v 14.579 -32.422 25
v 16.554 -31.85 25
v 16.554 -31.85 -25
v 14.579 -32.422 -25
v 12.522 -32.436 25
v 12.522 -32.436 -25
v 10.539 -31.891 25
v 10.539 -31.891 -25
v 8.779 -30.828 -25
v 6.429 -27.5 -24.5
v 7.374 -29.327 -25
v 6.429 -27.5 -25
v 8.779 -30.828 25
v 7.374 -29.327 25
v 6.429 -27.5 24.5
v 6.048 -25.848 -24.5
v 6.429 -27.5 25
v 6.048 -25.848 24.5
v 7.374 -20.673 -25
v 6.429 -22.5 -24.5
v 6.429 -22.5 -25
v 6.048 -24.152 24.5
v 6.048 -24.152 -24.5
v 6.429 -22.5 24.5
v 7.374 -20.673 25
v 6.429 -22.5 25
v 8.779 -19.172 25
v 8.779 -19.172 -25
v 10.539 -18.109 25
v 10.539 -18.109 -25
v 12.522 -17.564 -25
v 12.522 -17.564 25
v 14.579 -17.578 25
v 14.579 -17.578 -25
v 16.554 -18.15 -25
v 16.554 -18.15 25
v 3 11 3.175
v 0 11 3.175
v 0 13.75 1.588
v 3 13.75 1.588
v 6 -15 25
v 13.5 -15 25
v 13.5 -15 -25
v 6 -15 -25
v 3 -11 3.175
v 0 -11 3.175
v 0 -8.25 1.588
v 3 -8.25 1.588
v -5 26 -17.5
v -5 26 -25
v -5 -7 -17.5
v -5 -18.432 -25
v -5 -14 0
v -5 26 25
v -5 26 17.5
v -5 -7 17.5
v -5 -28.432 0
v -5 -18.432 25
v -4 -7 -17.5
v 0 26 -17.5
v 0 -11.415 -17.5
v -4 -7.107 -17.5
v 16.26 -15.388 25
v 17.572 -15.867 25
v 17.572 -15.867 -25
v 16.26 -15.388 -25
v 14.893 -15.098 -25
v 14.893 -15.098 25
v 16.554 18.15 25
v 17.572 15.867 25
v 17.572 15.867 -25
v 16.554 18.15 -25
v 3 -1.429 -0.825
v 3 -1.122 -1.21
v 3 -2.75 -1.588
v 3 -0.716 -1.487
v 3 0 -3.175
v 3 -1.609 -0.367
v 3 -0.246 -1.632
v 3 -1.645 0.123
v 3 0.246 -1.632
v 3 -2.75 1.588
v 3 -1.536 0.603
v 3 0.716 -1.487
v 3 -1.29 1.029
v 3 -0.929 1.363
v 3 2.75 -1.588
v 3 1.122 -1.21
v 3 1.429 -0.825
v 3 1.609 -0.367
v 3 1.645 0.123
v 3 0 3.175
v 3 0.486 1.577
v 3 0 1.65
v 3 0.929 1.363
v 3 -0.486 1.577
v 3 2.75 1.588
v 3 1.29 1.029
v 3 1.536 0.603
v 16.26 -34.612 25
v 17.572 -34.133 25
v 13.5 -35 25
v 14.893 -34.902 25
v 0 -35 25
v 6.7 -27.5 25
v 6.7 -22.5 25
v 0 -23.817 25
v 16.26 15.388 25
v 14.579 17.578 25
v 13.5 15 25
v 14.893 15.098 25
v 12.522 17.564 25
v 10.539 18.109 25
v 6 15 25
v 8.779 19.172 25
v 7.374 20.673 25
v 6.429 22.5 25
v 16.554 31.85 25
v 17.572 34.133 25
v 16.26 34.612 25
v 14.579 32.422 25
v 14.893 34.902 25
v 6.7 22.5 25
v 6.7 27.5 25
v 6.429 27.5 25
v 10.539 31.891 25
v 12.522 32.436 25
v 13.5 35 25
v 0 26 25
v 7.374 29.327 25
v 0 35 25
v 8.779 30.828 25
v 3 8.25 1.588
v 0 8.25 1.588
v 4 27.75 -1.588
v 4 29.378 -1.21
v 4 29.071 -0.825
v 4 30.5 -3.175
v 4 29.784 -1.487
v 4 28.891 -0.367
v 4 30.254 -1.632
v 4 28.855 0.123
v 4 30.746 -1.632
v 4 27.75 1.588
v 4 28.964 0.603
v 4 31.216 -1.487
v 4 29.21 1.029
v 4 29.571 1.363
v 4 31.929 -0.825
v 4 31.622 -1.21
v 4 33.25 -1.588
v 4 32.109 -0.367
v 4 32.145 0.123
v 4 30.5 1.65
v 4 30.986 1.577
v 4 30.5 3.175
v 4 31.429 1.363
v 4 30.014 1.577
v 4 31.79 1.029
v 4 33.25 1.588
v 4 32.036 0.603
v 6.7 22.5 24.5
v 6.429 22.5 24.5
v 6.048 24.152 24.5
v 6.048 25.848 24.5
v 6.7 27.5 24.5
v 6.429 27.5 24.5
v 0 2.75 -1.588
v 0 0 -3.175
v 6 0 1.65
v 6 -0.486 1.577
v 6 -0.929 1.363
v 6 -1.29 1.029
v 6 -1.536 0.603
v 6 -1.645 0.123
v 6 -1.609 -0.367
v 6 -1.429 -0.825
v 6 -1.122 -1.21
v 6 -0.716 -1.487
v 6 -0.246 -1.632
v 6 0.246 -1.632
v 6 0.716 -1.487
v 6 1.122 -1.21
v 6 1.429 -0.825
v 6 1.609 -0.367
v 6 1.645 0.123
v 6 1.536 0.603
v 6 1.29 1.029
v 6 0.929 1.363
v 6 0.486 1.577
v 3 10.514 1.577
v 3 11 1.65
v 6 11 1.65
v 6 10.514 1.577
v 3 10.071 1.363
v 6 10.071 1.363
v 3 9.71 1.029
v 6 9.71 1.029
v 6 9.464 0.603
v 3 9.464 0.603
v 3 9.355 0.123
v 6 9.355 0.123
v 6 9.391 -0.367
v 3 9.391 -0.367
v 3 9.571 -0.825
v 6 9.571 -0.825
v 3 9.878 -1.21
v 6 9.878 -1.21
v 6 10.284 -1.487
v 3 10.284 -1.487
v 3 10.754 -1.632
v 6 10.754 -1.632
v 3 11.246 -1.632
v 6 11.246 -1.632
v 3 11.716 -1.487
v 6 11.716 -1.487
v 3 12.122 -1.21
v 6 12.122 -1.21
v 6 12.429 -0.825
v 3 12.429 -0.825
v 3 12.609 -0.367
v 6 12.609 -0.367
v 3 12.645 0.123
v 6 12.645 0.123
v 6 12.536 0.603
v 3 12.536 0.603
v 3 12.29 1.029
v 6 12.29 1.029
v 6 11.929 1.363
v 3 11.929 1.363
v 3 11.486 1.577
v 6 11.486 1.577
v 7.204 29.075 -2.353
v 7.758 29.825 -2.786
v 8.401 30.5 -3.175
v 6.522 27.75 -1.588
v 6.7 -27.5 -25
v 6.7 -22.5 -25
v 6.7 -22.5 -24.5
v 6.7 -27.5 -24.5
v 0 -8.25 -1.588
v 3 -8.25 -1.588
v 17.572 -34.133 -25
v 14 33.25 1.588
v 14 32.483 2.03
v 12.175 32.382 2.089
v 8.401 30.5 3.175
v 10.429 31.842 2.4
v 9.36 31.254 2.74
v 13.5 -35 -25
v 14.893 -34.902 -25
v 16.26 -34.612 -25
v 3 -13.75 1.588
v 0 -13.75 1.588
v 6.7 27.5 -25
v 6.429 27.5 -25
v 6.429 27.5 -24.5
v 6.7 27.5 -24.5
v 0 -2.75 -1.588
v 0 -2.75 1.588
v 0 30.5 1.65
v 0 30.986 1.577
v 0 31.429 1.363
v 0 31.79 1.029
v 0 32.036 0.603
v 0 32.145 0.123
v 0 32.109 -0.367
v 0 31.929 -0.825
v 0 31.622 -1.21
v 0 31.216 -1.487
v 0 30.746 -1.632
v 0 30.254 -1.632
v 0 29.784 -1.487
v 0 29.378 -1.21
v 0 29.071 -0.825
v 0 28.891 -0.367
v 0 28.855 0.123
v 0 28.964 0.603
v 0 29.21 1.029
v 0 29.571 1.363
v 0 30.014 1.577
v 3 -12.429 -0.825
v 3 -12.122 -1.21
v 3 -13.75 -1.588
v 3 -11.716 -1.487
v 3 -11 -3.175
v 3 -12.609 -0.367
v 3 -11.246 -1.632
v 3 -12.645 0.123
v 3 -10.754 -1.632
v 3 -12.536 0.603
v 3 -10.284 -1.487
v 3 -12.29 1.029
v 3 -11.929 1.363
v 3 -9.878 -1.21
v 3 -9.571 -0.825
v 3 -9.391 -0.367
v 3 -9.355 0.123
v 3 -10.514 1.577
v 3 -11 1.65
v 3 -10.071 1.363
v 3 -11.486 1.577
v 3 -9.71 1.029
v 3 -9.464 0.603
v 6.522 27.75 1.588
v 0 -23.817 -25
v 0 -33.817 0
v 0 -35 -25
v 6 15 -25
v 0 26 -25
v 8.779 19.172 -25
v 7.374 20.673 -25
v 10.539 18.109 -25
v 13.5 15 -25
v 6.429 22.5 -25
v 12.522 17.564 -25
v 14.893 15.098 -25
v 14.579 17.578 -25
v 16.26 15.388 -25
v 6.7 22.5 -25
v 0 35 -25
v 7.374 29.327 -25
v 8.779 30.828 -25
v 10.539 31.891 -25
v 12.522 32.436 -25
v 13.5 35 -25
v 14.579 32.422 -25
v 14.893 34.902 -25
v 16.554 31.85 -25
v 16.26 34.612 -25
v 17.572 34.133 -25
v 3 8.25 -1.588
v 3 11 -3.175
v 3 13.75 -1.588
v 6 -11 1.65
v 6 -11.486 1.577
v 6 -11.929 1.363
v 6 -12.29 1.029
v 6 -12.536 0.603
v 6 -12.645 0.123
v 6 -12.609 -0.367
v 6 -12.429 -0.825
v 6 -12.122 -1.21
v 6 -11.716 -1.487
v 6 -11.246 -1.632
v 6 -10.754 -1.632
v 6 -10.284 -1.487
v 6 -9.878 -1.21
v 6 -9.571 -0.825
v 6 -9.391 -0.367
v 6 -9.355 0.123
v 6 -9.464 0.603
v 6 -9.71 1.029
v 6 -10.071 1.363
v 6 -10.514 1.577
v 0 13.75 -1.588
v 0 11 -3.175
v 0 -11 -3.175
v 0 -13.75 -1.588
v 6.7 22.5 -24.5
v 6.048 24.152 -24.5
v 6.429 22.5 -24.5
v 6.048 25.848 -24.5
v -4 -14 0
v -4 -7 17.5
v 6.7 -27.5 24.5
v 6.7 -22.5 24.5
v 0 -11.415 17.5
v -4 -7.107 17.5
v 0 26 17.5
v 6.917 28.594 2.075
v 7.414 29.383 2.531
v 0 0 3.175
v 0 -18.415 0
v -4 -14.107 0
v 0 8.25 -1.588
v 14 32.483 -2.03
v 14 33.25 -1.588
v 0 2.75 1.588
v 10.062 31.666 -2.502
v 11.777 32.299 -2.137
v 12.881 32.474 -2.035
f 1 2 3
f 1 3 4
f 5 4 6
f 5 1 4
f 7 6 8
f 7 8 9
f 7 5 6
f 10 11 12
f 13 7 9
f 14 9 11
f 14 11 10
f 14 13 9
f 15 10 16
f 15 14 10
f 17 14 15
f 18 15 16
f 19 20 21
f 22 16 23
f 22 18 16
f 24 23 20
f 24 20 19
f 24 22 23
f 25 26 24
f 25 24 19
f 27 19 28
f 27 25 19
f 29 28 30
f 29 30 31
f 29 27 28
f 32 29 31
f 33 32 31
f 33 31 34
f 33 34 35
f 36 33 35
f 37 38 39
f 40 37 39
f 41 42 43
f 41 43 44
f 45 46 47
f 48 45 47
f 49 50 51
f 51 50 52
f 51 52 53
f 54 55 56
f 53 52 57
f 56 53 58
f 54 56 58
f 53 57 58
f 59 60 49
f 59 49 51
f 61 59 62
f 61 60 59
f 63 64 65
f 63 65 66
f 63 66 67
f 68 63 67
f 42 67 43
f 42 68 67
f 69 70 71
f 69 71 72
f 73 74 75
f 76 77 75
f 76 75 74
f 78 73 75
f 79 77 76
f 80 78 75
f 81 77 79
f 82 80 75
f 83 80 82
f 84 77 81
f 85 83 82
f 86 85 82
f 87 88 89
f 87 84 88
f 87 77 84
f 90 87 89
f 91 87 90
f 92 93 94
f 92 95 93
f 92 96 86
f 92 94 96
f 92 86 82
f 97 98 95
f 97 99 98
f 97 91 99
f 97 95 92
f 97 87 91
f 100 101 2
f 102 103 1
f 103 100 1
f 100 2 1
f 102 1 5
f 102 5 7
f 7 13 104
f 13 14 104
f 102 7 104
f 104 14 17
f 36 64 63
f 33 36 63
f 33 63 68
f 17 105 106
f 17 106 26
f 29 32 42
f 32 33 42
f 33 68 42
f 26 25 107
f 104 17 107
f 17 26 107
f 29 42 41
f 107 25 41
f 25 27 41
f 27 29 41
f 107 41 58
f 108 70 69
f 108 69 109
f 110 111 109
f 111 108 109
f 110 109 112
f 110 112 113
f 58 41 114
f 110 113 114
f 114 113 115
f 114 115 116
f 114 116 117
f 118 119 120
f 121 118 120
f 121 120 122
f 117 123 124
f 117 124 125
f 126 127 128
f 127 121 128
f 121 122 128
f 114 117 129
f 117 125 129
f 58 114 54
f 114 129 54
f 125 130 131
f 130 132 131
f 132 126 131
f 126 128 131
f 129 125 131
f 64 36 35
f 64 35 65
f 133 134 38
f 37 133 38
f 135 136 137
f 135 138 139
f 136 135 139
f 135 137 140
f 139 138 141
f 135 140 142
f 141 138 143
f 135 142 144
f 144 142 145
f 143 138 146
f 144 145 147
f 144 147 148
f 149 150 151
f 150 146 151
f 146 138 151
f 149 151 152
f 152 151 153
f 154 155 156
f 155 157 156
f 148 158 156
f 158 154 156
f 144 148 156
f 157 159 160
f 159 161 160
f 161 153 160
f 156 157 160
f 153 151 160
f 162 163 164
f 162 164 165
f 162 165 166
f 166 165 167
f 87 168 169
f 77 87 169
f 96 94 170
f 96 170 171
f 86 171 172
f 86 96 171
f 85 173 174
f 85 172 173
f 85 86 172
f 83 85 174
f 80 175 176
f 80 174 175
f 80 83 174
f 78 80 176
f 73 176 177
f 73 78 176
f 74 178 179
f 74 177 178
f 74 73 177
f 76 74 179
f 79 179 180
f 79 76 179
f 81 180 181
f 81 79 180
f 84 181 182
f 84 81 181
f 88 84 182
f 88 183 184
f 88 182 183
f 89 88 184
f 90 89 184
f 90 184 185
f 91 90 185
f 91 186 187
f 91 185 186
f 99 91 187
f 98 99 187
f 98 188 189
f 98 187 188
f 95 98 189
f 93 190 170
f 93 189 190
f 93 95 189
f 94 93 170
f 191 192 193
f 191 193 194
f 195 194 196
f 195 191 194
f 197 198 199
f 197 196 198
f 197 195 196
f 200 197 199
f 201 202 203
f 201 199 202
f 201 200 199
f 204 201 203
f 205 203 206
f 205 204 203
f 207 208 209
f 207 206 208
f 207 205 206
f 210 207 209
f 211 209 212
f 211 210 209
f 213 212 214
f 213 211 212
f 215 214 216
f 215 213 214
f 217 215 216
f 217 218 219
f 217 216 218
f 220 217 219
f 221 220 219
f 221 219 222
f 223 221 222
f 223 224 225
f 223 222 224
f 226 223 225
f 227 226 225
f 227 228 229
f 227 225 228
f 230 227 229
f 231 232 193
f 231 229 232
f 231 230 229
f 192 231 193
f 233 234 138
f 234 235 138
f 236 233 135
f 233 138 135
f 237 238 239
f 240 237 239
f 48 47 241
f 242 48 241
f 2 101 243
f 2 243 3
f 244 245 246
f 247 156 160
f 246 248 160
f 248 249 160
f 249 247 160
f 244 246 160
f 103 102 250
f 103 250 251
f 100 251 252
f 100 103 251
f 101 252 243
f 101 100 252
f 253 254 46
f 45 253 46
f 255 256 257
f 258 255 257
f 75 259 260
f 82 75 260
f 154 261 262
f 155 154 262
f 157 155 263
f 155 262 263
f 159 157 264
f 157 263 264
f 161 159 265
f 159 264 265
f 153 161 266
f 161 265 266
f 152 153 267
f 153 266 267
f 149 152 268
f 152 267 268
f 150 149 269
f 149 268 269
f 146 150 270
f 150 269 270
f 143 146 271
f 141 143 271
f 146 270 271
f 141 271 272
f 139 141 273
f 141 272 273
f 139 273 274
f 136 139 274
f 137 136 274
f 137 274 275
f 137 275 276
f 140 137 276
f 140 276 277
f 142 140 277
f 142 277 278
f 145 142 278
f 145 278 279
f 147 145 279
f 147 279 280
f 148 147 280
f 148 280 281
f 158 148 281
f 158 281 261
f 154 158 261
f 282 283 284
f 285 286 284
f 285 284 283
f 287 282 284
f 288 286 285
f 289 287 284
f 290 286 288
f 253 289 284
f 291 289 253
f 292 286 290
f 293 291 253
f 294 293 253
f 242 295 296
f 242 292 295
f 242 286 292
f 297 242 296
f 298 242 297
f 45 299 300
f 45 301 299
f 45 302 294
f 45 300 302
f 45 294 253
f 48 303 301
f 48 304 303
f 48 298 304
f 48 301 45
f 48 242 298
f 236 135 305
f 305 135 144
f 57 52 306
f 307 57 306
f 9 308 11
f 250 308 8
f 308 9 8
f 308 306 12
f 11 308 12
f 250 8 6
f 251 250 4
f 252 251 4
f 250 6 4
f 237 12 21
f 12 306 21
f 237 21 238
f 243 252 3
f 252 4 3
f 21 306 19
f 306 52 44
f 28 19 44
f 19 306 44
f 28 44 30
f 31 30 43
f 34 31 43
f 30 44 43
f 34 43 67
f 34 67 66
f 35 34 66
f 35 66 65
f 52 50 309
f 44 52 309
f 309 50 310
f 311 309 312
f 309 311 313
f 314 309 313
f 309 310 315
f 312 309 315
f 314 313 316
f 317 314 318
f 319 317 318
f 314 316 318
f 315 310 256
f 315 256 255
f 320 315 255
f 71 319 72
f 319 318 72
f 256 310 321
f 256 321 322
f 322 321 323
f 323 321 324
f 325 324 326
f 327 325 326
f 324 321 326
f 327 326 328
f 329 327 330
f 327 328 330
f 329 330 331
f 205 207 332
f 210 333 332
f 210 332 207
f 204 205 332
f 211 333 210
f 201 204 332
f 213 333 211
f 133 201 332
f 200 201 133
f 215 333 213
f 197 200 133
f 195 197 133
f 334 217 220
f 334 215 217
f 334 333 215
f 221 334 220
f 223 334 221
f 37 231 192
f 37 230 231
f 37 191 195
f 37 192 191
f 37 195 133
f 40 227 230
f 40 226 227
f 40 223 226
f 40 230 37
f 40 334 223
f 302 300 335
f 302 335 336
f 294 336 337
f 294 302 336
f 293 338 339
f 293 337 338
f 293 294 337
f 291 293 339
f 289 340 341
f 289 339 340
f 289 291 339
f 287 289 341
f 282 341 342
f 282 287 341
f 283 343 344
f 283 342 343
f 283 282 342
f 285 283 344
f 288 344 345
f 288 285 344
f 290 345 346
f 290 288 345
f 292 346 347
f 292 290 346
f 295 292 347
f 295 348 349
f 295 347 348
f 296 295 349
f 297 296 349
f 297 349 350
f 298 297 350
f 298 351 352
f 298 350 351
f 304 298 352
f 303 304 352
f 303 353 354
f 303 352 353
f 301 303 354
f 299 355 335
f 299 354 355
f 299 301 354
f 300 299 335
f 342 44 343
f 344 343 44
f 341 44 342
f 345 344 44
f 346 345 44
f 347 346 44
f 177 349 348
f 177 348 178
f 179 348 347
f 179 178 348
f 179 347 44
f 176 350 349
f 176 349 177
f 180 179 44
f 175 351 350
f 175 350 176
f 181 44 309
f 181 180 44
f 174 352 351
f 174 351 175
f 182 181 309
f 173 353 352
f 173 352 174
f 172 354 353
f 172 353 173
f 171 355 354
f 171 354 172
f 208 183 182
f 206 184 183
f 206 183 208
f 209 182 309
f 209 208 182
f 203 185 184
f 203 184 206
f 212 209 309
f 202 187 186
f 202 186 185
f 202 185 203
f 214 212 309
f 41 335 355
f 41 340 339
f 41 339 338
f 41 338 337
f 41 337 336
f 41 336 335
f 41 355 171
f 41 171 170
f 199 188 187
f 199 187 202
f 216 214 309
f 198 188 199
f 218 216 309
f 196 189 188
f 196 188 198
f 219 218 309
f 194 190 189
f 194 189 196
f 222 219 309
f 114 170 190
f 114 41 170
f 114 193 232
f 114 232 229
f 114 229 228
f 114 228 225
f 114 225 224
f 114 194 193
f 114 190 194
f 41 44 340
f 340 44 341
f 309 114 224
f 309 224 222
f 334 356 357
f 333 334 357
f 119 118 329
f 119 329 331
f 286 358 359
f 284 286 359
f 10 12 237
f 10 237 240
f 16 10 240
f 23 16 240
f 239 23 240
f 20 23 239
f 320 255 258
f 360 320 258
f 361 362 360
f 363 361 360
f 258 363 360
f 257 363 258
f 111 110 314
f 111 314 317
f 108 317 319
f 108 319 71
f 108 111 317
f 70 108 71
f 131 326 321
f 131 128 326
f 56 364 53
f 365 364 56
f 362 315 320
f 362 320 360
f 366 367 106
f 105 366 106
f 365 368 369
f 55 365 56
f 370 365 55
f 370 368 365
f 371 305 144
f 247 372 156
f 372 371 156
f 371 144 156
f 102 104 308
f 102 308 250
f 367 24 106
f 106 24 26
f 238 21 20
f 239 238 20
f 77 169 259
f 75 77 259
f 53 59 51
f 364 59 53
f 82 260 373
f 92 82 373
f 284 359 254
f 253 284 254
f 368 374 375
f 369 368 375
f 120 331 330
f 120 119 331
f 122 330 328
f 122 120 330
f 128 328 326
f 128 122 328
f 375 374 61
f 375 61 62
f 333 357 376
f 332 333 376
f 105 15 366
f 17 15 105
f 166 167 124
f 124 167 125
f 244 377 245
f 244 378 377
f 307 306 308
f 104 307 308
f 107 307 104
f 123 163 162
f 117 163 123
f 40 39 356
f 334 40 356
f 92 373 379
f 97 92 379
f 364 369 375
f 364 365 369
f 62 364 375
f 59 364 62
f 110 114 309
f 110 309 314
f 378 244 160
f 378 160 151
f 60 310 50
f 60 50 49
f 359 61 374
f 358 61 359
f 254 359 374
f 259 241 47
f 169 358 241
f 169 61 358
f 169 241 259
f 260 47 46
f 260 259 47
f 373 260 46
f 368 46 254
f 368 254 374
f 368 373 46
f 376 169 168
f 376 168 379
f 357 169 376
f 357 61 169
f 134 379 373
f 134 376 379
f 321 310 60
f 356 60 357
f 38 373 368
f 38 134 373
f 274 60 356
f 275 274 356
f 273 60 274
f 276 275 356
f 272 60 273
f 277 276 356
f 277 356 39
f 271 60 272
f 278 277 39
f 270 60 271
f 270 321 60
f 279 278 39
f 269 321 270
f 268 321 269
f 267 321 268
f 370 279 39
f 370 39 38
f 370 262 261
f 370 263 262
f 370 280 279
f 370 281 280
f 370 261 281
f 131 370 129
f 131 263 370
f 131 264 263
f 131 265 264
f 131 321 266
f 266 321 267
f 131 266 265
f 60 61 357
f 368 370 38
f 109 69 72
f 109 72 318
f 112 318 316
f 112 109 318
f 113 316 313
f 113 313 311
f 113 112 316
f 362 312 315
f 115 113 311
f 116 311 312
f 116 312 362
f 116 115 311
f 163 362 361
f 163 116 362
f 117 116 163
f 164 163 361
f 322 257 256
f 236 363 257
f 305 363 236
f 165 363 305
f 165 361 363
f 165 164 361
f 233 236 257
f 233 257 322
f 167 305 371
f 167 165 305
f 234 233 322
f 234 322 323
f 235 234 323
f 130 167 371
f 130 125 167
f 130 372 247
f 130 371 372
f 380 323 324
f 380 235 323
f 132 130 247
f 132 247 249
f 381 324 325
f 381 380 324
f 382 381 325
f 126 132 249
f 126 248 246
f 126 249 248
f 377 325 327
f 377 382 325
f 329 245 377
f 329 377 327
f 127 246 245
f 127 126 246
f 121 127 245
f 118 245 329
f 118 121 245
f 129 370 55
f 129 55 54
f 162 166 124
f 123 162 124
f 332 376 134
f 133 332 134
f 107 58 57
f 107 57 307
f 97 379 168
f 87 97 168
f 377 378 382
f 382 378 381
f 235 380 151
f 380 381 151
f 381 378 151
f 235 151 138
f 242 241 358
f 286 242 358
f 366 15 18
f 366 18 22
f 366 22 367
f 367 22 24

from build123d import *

# Parameters (mm, degrees)
RESSALTO_EXTRUS_O1_DEPTH   = 25
CORTE_EXTRUS_O3_DEPTH      = 6
CORTE_EXTRUS_O3_DEPTH_BACK = 10
ESBO_O6_R                  = 1.65
CORTE_EXTRUS_O5_DEPTH      = 3
ESBO_O10_W                 = 0.5
ESBO_O10_H                 = 5
RESSALTO_EXTRUS_O3_DEPTH   = 6.7
RESSALTO_EXTRUS_O4_DEPTH   = 5
CORTE_EXTRUS_O6_START      = -1
CORTE_EXTRUS_O6_DEPTH      = 4
CHANFRO1_SIZE              = 6.4
ESBO_O13_R                 = 1.65
CORTE_EXTRUS_O7_DEPTH      = 13
CORTE_EXTRUS_O8_START      = -4
CORTE_EXTRUS_O8_DEPTH      = 10
CHANFRO2_SIZE              = 6.4


with BuildPart() as part:
    # Esboço1 → Ressalto-extrusão1 (new, symmetric)
    with BuildSketch(Plane.XY):
        with BuildLine():
            Line((0, 35), (0, -35))
            Line((0, -35), (13.5, -35))
            ThreePointArc((13.5, -35), (15.581665999, -34.780933834), (17.572127481, -34.133333333))
            Line((17.572127481, -34.133333333), (16.554095611, -31.85))
            ThreePointArc((16.554095611, -31.85), (6, -25), (16.554095611, -18.15))
            Line((16.554095611, -18.15), (17.572127481, -15.866666667))
            ThreePointArc((17.572127481, -15.866666667), (15.581665999, -15.219066166), (13.5, -15))
            Line((13.5, -15), (6, -15))
            Line((6, -15), (6, 15))
            Line((6, 15), (13.5, 15))
            ThreePointArc((13.5, 15), (15.581665999, 15.219066166), (17.572127481, 15.866666667))
            Line((17.572127481, 15.866666667), (16.554095611, 18.15))
            ThreePointArc((16.554095611, 18.15), (6, 25), (16.554095611, 31.85))
            Line((16.554095611, 31.85), (17.572127481, 34.133333333))
            ThreePointArc((17.572127481, 34.133333333), (15.581665999, 34.780933834), (13.5, 35))
            Line((13.5, 35), (0, 35))
        make_face()
    extrude(amount=RESSALTO_EXTRUS_O1_DEPTH, both=True)

    # Esboço6 → Corte-extrusão3 (cut, two sides: drawn at the far end of the back side and taken through both)
    with BuildSketch(Plane(origin=(6, 0, 0), x_dir=(0, 0, -1), z_dir=(1, 0, 0)).offset(-CORTE_EXTRUS_O3_DEPTH_BACK)):
        with Locations(Location((0, 11, 0), (0, 0, 180))):
            Circle(ESBO_O6_R)
        with Locations(Location((0, -11, 0), (0, 0, 180))):
            Circle(ESBO_O6_R)
        with Locations(Location((0, 0, 0), (0, 0, 180))):
            Circle(ESBO_O6_R)
    extrude(amount=CORTE_EXTRUS_O3_DEPTH + CORTE_EXTRUS_O3_DEPTH_BACK, mode=Mode.SUBTRACT)

    # Esboço9 → Corte-extrusão5 (cut)
    with BuildSketch(Plane.ZY):
        Polygon((3.175426481, 11), (1.58771324, 13.75), (-1.58771324, 13.75), (-3.175426481, 11), (-1.58771324, 8.25), (1.58771324, 8.25), align=None)
        Polygon((3.175426481, 0), (1.58771324, 2.75), (-1.58771324, 2.75), (-3.175426481, 0), (-1.58771324, -2.75), (1.58771324, -2.75), align=None)
        Polygon((3.175426481, -11), (1.58771324, -8.25), (-1.58771324, -8.25), (-3.175426481, -11), (-1.58771324, -13.75), (1.58771324, -13.75), align=None)
    extrude(amount=-CORTE_EXTRUS_O5_DEPTH, mode=Mode.SUBTRACT)

    # Esboço10 → Ressalto-extrusão3 (add)
    with BuildSketch(Plane.ZY):
        with Locations((-24.75, 25)):
            Rectangle(ESBO_O10_W, ESBO_O10_H)
        with Locations((24.75, 25)):
            Rectangle(ESBO_O10_W, ESBO_O10_H)
        with Locations((24.75, -25)):
            Rectangle(ESBO_O10_W, ESBO_O10_H)
        with Locations((-24.75, -25)):
            Rectangle(ESBO_O10_W, ESBO_O10_H)
    extrude(amount=-RESSALTO_EXTRUS_O3_DEPTH)

    # Esboço11 → Ressalto-extrusão4 (add)
    with BuildSketch(Plane.ZY):
        Polygon((-17.5, -7), (0, -14), (17.5, -7), (17.5, 26), (25, 26), (25, -16.924395537), (0, -26.924395537), (-25, -16.924395537), (-25, 26), (-17.5, 26), align=None)
    extrude(amount=RESSALTO_EXTRUS_O4_DEPTH)

    # Esboço12 → Corte-extrusão6 (cut)
    with BuildSketch(Plane.ZY.offset(5).offset(CORTE_EXTRUS_O6_START)):
        Polygon((-17.5, -7), (17.5, -7), (17.5, -14), (0, -21), (-17.5, -14), align=None)
    extrude(amount=-CORTE_EXTRUS_O6_DEPTH, mode=Mode.SUBTRACT)

    # Chanfro1
    # the kernel refuses this chamfer: 6.4 mm, written as the material it adds along each edge
    with BuildSketch(Plane(origin=(-4, -27.112634139, 15.281585348), x_dir=(0.9996219169112968, -0.025529280528386773, -0.01021171221135471), z_dir=(0, 0.3713906763541037, -0.9284766908852593))) as chanfro1_piece_1_section:
        Polygon((CHANFRO1_SIZE * 0.999621916911, -CHANFRO1_SIZE * 0.0274958766106), (-CHANFRO1_SIZE * 0.0274958766106, -CHANFRO1_SIZE * 0.999621916911), (0, 0), align=None)
    chanfro1_piece_1 = extrude(amount=51.765619071, mode=Mode.PRIVATE)
    chanfro1_piece_1 = split(chanfro1_piece_1, bisect_by=Plane(origin=(-1.981352532, -15.655988855, -17.5), z_dir=(0, 0, 1)), keep=Keep.TOP, mode=Mode.PRIVATE)
    chanfro1_piece_1 = split(chanfro1_piece_1, bisect_by=Plane(origin=(-1.981352532, -22.750248134, -4.375620334), z_dir=(0, 0.9284766908852595, -0.37139067635410344)), keep=Keep.TOP, mode=Mode.PRIVATE)
    add(chanfro1_piece_1)
    with BuildSketch(Plane(origin=(-4, -7.887365861, 32.781585348), x_dir=(0.9996219169112968, -0.02552928052838657, 0.010211712211354616), z_dir=(0, -0.37139067635410344, -0.9284766908852595))) as chanfro1_piece_2_section:
        Polygon((CHANFRO1_SIZE * 0.999621916911, -CHANFRO1_SIZE * 0.0274958766106), (-CHANFRO1_SIZE * 0.0274958766106, -CHANFRO1_SIZE * 0.999621916911), (0, 0), align=None)
    chanfro1_piece_2 = extrude(amount=51.765619071, mode=Mode.PRIVATE)
    chanfro1_piece_2 = split(chanfro1_piece_2, bisect_by=Plane(origin=(-1.981352532, -22.750248134, 4.375620334), z_dir=(0, 0.9284766908852595, 0.3713906763541038)), keep=Keep.TOP, mode=Mode.PRIVATE)
    chanfro1_piece_2 = split(chanfro1_piece_2, bisect_by=Plane(origin=(-1.981352532, -15.655988855, 17.5), z_dir=(0, 0, -1)), keep=Keep.TOP, mode=Mode.PRIVATE)
    add(chanfro1_piece_2)

    # Esboço13 → Corte-extrusão7 (cut)
    with BuildSketch(Plane.ZY):
        with Locations((0, 30.5)):
            Circle(ESBO_O13_R)
    extrude(amount=-CORTE_EXTRUS_O7_DEPTH, mode=Mode.SUBTRACT)

    # Esboço14 → Corte-extrusão8 (cut)
    with BuildSketch(Plane.ZY.offset(CORTE_EXTRUS_O8_START)):
        Polygon((3.175426481, 30.5), (1.58771324, 33.25), (-1.58771324, 33.25), (-3.175426481, 30.5), (-1.58771324, 27.75), (1.58771324, 27.75), align=None)
    extrude(amount=-CORTE_EXTRUS_O8_DEPTH, mode=Mode.SUBTRACT)

    # Chanfro2
    # the kernel refuses this chamfer: 6.4 mm, written as the material it adds along each edge
    with BuildSketch(Plane(origin=(0, -33.037029676, 15.281585348), x_dir=(-0.9996219169112968, 0.02552928052838658, 0.010211712211354642), z_dir=(0, 0.37139067635410405, -0.9284766908852592))) as chanfro2_piece_1_section:
        Polygon((CHANFRO2_SIZE * 0.999621916911, -CHANFRO2_SIZE * 0.0274958766106), (-CHANFRO2_SIZE * 0.0274958766106, -CHANFRO2_SIZE * 0.999621916911), (0, 0), align=None)
    chanfro2_piece_1 = extrude(amount=59.843366282, mode=Mode.PRIVATE)
    chanfro2_piece_1 = split(chanfro2_piece_1, bisect_by=Plane(origin=(-5, -23.598020322, -13.89468732), z_dir=(1, 0, 0)), keep=Keep.TOP, mode=Mode.PRIVATE)
    chanfro2_piece_1 = split(chanfro2_piece_1, bisect_by=Plane(origin=(-1.952897505, -23.598020322, -25), z_dir=(0, 0, 1)), keep=Keep.TOP, mode=Mode.PRIVATE)
    chanfro2_piece_1 = split(chanfro2_piece_1, bisect_by=Plane(origin=(-1.952897505, -31.256856652, -10.831152788), z_dir=(0, 0.9284766908852593, -0.3713906763541039)), keep=Keep.TOP, mode=Mode.PRIVATE)
    add(chanfro2_piece_1)
    with BuildSketch(Plane(origin=(0, -10.811761398, 40.281585348), x_dir=(-0.9996219169112968, 0.02552928052838644, -0.010211712211354581), z_dir=(0, -0.3713906763541039, -0.9284766908852593))) as chanfro2_piece_2_section:
        Polygon((CHANFRO2_SIZE * 0.999621916911, -CHANFRO2_SIZE * 0.0274958766106), (-CHANFRO2_SIZE * 0.0274958766106, -CHANFRO2_SIZE * 0.999621916911), (0, 0), align=None)
    chanfro2_piece_2 = extrude(amount=59.843366282, mode=Mode.PRIVATE)
    chanfro2_piece_2 = split(chanfro2_piece_2, bisect_by=Plane(origin=(-5, -23.598020322, 13.89468732), z_dir=(1, 0, 0)), keep=Keep.TOP, mode=Mode.PRIVATE)
    chanfro2_piece_2 = split(chanfro2_piece_2, bisect_by=Plane(origin=(-1.952897505, -23.598020322, 25), z_dir=(0, 0, -1)), keep=Keep.TOP, mode=Mode.PRIVATE)
    chanfro2_piece_2 = split(chanfro2_piece_2, bisect_by=Plane(origin=(-1.952897505, -31.256856652, 10.831152788), z_dir=(0, 0.9284766908852592, 0.37139067635410405)), keep=Keep.TOP, mode=Mode.PRIVATE)
    add(chanfro2_piece_2)
    with BuildSketch(Plane(origin=(0, -10.811761398, 40.281585348), x_dir=(-0.9996219169112968, 0.02552928052838644, -0.010211712211354581), z_dir=(0, -0.3713906763541039, -0.9284766908852593))) as chanfro2_piece_3a_section:
        Polygon((CHANFRO2_SIZE * 0.999621916911, -CHANFRO2_SIZE * 0.0274958766106), (-CHANFRO2_SIZE * 0.0274958766106, -CHANFRO2_SIZE * 0.999621916911), (0, 0), align=None)
    chanfro2_piece_3a = extrude(amount=59.843366282, mode=Mode.PRIVATE)
    chanfro2_piece_3a = split(chanfro2_piece_3a, bisect_by=Plane(origin=(-5, -31.260156378, -5.039042683), z_dir=(1, 0, 0)), keep=Keep.TOP, mode=Mode.PRIVATE)
    chanfro2_piece_3a = split(chanfro2_piece_3a, bisect_by=Plane(origin=(-1.927343951, -25.78483059, -2.848912368), z_dir=(0, -0.9284766908852592, -0.37139067635410405)), keep=Keep.TOP, mode=Mode.PRIVATE)
    chanfro2_piece_3a = split(chanfro2_piece_3a, bisect_by=Plane(origin=(-1.927343951, -35, -5.039042683), z_dir=(0, 1, 0)), keep=Keep.TOP, mode=Mode.PRIVATE)
    with BuildSketch(Plane(origin=(0, -33.037029676, 15.281585348), x_dir=(-0.9996219169112968, 0.02552928052838658, 0.010211712211354642), z_dir=(0, 0.37139067635410405, -0.9284766908852592))) as chanfro2_piece_3b_section:
        Polygon((CHANFRO2_SIZE * 0.999621916911, -CHANFRO2_SIZE * 0.0274958766106), (-CHANFRO2_SIZE * 0.0274958766106, -CHANFRO2_SIZE * 0.999621916911), (0, 0), align=None)
    chanfro2_piece_3b = extrude(amount=59.843366282, mode=Mode.PRIVATE)
    chanfro2_piece_3b = split(chanfro2_piece_3b, bisect_by=Plane(origin=(-5, -31.260156378, 5.039042683), z_dir=(1, 0, 0)), keep=Keep.TOP, mode=Mode.PRIVATE)
    chanfro2_piece_3b = split(chanfro2_piece_3b, bisect_by=Plane(origin=(-1.927343951, -25.78483059, 2.848912368), z_dir=(0, -0.9284766908852593, 0.3713906763541039)), keep=Keep.TOP, mode=Mode.PRIVATE)
    chanfro2_piece_3b = split(chanfro2_piece_3b, bisect_by=Plane(origin=(-1.927343951, -35, 5.039042683), z_dir=(0, 1, 0)), keep=Keep.TOP, mode=Mode.PRIVATE)
    chanfro2_piece_3 = chanfro2_piece_3a & chanfro2_piece_3b
    add(chanfro2_piece_3)


solid = part.part
